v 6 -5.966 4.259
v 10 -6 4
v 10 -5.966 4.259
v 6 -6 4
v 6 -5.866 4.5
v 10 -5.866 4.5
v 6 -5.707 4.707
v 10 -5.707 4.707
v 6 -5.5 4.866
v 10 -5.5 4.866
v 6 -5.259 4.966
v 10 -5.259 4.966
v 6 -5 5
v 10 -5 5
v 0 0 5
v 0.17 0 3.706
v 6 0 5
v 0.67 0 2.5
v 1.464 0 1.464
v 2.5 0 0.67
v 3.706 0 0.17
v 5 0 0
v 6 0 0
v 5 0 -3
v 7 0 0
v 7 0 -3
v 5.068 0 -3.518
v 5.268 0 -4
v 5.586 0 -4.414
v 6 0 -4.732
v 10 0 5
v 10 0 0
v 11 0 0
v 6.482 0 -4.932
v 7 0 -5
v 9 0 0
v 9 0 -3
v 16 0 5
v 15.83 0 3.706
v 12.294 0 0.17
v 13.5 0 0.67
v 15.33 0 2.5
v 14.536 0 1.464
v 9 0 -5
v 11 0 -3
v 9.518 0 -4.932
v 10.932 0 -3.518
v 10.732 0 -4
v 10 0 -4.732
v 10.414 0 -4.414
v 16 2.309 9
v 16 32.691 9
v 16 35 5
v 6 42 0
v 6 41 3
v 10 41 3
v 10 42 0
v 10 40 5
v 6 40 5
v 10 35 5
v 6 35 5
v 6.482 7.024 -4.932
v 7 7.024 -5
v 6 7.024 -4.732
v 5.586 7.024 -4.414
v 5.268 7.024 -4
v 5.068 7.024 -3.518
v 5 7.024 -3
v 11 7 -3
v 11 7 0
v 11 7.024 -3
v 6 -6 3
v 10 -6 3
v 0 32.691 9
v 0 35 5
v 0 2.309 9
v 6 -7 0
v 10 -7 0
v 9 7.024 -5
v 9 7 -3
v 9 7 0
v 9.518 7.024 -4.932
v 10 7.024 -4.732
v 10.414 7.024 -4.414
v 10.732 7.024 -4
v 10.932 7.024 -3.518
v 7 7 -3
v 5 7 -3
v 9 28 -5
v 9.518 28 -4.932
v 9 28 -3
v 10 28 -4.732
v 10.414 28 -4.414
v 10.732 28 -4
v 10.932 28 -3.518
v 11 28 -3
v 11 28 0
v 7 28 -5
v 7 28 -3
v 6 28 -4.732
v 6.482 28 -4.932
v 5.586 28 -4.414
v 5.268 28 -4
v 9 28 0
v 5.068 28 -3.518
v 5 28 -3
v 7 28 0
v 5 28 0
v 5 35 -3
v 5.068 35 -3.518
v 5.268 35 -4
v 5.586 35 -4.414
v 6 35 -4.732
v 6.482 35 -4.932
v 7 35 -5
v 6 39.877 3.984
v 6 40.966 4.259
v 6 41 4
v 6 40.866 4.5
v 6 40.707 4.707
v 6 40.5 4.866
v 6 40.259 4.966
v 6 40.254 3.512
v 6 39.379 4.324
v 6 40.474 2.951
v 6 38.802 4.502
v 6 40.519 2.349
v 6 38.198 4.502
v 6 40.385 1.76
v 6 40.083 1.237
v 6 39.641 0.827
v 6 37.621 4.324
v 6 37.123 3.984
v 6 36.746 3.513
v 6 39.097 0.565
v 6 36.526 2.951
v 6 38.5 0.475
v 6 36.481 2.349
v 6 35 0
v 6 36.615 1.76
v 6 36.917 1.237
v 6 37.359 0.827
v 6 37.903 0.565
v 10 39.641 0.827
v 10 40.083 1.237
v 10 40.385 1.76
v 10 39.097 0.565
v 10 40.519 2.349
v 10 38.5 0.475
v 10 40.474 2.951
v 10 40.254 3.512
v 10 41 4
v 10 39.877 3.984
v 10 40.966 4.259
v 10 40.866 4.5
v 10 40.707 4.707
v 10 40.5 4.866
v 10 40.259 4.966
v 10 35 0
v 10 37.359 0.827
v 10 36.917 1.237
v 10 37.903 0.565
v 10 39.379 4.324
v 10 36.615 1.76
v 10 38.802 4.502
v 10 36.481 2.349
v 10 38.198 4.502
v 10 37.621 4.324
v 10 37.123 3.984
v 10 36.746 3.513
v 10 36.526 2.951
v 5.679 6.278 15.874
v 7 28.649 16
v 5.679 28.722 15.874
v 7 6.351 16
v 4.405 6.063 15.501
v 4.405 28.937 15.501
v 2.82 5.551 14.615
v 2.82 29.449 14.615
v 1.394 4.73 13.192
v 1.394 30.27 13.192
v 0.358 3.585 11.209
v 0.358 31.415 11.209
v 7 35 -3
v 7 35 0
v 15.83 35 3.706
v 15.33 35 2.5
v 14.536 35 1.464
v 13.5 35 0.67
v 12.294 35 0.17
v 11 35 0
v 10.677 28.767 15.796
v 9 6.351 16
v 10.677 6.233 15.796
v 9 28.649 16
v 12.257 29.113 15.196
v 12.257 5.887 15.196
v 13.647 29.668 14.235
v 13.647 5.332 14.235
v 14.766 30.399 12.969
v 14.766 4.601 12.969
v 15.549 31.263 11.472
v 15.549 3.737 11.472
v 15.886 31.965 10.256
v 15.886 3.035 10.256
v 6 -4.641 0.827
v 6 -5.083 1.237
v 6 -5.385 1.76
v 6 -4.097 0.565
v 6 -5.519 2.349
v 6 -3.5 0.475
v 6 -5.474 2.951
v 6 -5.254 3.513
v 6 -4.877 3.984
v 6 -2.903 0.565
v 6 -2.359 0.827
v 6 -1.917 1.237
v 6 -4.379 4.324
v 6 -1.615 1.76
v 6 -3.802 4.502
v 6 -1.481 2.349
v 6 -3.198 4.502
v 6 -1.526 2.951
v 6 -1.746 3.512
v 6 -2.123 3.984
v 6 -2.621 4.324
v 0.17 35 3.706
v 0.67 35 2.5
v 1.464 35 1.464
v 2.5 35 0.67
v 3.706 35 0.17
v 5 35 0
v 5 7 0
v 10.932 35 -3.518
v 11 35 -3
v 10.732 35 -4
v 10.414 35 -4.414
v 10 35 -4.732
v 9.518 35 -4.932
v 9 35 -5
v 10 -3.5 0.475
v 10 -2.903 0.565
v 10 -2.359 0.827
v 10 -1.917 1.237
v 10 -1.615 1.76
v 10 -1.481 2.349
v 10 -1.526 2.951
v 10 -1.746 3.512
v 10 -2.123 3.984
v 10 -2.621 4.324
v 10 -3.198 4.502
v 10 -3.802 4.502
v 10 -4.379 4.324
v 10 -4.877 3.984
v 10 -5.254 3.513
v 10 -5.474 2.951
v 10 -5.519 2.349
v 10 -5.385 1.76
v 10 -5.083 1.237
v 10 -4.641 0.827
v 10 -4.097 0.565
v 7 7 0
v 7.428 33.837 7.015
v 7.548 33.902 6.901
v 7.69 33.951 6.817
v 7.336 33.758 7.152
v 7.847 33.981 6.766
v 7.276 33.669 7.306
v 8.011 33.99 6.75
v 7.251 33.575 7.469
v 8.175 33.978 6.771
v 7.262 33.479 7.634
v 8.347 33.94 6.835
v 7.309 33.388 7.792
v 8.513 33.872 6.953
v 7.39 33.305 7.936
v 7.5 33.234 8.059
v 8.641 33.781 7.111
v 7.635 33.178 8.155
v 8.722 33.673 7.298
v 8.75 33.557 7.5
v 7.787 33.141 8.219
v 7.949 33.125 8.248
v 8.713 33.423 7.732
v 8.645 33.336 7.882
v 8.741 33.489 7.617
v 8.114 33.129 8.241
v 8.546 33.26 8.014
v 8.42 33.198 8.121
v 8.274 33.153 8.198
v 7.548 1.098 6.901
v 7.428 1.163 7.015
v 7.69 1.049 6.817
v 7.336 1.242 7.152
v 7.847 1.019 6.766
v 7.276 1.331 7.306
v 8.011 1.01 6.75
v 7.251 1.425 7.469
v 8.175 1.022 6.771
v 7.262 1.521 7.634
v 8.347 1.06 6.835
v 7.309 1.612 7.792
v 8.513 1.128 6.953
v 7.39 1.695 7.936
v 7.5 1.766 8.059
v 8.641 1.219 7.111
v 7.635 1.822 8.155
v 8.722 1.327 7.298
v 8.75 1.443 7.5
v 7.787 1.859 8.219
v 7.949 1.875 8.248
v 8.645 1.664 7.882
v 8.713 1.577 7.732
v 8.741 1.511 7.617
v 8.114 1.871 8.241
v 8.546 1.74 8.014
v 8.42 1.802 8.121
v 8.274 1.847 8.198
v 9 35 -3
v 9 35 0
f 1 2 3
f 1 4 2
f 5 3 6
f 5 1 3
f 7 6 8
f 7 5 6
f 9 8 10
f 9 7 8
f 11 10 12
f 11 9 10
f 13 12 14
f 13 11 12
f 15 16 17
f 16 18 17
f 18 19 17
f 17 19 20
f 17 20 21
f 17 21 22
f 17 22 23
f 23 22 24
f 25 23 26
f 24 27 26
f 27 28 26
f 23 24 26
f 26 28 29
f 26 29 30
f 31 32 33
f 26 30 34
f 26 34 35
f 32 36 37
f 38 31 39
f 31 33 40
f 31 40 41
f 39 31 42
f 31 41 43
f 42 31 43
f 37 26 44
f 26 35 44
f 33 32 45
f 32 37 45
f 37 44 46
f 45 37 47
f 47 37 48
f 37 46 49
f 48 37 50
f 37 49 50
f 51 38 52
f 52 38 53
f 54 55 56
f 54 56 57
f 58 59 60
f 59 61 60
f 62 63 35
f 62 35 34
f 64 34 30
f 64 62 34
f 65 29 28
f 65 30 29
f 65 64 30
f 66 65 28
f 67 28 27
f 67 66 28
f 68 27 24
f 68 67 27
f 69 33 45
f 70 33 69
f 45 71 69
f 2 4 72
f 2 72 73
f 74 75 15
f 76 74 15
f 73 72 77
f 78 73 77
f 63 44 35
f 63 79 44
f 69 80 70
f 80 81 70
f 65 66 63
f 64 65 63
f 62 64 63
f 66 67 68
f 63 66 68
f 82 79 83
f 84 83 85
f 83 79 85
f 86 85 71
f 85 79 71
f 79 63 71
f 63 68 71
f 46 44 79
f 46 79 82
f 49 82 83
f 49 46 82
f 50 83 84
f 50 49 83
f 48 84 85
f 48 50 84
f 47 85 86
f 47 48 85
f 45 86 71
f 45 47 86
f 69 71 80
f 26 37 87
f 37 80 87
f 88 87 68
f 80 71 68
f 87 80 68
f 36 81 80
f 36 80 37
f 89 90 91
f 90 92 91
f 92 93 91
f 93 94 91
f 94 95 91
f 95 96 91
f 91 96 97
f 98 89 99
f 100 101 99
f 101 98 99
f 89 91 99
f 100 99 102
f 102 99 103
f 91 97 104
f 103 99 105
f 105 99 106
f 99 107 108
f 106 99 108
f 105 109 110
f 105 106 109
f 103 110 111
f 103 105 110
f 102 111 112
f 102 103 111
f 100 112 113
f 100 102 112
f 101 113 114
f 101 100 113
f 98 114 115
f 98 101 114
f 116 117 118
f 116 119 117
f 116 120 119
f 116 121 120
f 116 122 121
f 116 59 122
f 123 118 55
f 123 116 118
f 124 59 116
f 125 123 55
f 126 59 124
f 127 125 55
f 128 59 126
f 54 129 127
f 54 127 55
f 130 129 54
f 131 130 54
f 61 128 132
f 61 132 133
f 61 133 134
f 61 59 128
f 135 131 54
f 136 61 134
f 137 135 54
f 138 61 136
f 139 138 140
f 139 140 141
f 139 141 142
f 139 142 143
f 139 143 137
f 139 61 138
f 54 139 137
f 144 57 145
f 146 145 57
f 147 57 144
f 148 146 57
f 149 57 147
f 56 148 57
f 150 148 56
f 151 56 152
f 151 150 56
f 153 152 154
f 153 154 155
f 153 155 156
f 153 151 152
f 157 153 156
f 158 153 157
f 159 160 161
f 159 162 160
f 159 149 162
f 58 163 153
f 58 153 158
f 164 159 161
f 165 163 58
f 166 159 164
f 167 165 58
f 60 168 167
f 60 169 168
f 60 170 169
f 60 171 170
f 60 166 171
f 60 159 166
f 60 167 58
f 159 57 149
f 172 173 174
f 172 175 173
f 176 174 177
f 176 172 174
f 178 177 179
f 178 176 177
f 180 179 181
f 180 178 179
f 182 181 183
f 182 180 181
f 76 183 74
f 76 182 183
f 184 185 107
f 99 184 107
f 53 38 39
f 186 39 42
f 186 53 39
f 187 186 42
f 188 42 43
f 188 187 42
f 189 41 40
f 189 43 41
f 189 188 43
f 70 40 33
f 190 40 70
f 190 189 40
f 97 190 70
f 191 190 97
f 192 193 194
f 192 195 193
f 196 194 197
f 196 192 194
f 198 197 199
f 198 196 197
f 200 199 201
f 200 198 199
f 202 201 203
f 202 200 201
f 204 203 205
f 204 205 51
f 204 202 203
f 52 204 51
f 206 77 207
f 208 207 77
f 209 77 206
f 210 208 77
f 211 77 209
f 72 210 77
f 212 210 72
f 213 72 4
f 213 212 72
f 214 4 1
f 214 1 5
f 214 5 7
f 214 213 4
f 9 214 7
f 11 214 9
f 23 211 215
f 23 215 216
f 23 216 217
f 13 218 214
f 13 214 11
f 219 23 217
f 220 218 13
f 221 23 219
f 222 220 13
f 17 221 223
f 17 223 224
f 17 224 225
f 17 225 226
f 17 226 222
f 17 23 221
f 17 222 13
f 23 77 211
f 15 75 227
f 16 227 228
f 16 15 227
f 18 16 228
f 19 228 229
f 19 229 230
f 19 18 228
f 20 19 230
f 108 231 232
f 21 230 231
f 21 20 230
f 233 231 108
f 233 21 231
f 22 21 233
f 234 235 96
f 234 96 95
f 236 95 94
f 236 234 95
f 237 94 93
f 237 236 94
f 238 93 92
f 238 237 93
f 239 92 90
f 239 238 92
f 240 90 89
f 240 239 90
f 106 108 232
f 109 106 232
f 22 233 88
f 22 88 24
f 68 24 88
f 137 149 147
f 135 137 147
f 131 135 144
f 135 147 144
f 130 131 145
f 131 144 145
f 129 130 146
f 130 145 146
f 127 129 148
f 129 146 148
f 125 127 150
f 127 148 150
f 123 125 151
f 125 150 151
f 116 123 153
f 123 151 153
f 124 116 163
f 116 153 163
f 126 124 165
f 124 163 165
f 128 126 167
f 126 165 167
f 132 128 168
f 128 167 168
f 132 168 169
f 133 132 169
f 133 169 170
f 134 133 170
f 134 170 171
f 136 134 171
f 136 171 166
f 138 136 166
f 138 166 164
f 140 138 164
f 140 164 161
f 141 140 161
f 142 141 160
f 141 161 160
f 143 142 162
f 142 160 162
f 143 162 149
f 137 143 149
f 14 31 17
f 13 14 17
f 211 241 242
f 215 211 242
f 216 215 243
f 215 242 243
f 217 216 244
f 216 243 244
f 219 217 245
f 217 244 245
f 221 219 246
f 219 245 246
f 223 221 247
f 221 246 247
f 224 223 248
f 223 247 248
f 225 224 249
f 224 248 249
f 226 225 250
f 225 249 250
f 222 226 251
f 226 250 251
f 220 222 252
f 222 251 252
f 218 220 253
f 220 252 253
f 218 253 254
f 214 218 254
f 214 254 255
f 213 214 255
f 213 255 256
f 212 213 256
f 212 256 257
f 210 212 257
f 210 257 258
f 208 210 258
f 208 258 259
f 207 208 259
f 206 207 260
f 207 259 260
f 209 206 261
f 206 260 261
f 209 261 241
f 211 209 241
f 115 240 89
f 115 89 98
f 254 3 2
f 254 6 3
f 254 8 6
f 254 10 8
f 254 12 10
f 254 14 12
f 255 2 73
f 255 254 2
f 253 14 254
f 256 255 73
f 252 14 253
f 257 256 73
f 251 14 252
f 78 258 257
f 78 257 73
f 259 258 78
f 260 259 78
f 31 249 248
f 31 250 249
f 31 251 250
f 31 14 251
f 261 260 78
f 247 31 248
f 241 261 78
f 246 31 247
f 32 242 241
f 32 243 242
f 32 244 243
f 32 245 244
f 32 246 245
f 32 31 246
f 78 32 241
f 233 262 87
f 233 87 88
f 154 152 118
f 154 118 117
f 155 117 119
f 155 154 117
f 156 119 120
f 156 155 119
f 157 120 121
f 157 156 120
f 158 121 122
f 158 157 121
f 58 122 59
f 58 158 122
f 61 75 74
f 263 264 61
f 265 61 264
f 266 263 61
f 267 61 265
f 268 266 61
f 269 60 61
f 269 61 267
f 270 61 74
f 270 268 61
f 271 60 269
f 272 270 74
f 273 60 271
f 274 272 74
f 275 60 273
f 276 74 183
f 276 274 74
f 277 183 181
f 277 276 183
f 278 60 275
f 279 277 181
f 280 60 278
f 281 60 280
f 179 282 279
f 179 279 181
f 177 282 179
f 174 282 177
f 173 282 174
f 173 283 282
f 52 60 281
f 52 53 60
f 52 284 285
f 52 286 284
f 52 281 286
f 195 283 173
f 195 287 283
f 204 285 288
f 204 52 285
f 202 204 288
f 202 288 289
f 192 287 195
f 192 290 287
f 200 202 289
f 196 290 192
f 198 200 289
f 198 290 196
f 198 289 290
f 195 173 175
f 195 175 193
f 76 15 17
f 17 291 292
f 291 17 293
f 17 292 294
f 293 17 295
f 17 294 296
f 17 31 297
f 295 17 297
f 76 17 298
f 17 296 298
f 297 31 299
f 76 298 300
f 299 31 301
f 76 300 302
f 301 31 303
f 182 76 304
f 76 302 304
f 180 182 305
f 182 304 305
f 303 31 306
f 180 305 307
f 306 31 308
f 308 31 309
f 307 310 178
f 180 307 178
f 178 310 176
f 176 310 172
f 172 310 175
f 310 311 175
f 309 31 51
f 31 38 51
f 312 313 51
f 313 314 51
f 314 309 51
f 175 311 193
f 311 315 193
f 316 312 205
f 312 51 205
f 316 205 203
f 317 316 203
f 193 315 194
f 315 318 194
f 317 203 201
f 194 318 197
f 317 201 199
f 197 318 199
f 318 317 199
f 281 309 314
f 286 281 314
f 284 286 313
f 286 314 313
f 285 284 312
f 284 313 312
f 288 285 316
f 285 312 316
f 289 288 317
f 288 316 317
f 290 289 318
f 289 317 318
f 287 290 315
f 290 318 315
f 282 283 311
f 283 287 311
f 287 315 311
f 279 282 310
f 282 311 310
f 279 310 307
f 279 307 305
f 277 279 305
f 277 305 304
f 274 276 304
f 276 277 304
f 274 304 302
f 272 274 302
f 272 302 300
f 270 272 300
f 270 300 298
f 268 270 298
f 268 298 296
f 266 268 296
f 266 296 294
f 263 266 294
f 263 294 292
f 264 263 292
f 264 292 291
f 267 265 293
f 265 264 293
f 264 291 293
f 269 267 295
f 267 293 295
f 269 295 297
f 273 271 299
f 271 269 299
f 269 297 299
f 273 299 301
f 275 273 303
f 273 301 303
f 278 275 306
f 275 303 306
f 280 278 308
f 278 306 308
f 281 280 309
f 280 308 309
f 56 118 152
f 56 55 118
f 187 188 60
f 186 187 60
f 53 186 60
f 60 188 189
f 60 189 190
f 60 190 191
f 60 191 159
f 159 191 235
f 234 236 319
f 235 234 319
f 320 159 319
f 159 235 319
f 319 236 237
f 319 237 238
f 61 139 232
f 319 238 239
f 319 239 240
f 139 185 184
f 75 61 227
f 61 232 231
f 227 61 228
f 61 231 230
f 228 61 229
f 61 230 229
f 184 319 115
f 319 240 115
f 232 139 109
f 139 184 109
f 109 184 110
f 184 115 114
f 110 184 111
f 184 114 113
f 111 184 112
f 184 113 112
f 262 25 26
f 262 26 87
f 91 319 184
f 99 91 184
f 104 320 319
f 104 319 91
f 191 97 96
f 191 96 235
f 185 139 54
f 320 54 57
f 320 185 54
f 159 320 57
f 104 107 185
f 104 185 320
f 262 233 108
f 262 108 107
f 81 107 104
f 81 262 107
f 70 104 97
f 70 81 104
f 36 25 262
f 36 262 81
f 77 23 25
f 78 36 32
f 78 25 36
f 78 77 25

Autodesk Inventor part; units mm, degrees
ref_plane "YZ Plane" through (0, 0, 0) normal (1, 0, 0) x (0, 1, 0)
ref_plane "XZ Plane" through (0, 0, 0) normal (0, 1, 0) x (-1, 0, 0)
ref_plane "XY Plane" through (0, 0, 0) normal (0, 0, 1) x (1, 0, 0)
sketch "Sketch3" plane through (0, 0, 0) normal (0, 0, 1) x (1, 0, 0)
  line L0 (0, 0) -> (16, 0)
  line L1 (16, 0) -> (16, 35)
  line L2 (16, 35) -> (0, 35)
  line L3 (0, 35) -> (0, 0)
  dimension "d0" = 16
  dimension "d1" = 35
extrude "Extrusion1" add sketch "Sketch3" along normal blind 16
fillet "Fillet1" radius 7 2 edges at (16, 17.5, 16) (0, 17.5, 16)
fillet "Fillet2" radius 5 2 edges at (16, 17.5, 0) (0, 17.5, 0)
sketch "Sketch4" plane through (16, 0, 9) normal (1, 0, 0) x (0, 0, -1)
  line L0 (4, 35) -> (0, 35) projected
  line L1 (4, 35) -> (-7, 28.6491)
  line L2 (-7, 35) -> (-7, 0) projected
  line L3 (4, 35) -> (16.7017, 35) construction
  line L4 (-7, 28.6491) -> (-7, 35)
  line L5 (-7, 35) -> (4, 35)
  line L6 (4, 0) -> (0, 0) projected
  line L7 (4, 0) -> (-7, 6.3509)
  line L8 (4, 0) -> (16.7017, 0) construction
  line L9 (-7, 6.3509) -> (-7, 0)
  line L10 (-7, 0) -> (4, 0)
  point P0 (9, 0)
  point P1 (-7, 0)
  point P2 (0, 0)
  dimension "d6" = 150
  dimension "d7" = 150
extrude "Extrusion2" cut sketch "Sketch4" against normal through all
sketch "Sketch5" plane through (5, 35, 0) normal (0, 1, 0) x (1, 0, 0)
  line L0 (-5, -9) -> (-5, -5) projected
  line L1 (0, 0) -> (6, 0) projected
  line L2 (5, 0) -> (1, 0)
  line L3 (1, 0) -> (1, -5)
  line L4 (1, -5) -> (5, -5)
  line L5 (5, -5) -> (5, 0)
  line L6 (1, 0) -> (5, 0)
  point P0 (-5, 0)
  dimension "d47" = 4
extrude "Extrusion3" add sketch "Sketch5" along normal blind 6
sketch "Sketch11" plane through (0, 0, 0) normal (0, 0, -1) x (-1, 0, 0)
  line L0 (-11, 0) -> (-11, 35) projected
  line L1 (-9, 28.6491) -> (-9, 6.3509) projected
  line L2 (-11, 0) -> (-9, 0)
  line L3 (-9, 0) -> (-9, 7)
  line L4 (-9, 7) -> (-11, 7)
  line L5 (-11, 7) -> (-11, 0)
  line L6 (-5, 0) -> (-7, 0)
  line L7 (-7, 0) -> (-7, 7)
  line L8 (-7, 7) -> (-5, 7)
  line L9 (-5, 7) -> (-5, 0)
  line L10 (-11, 35) -> (-9, 35)
  line L11 (-9, 35) -> (-9, 28)
  line L12 (-9, 28) -> (-11, 28)
  line L13 (-11, 28) -> (-11, 35)
  line L14 (-5, 35) -> (-7, 35)
  line L15 (-7, 35) -> (-7, 28)
  line L16 (-7, 28) -> (-5, 28)
  line L17 (-5, 28) -> (-5, 35)
  point P0 (0, 0)
  point P1 (-9, 6.3509)
  point P2 (-11, 28)
  dimension "d32" = 7
  dimension "d33" = 2
  dimension "d34" = 7
  dimension "d35" = 7
  dimension "d36" = 7
extrude "Extrusion9" add sketch "Sketch11" along normal blind 3 contours L0 L4 L1 L3 L2 | L0 L10 L11 L1 L12 | L6 L7 L8 L9 | L17 L16 L15 L14
sketch "Sketch12" plane through (0, 0, -3) normal (0, 0, -1) x (-1, 0, 0)
  line L0 (-9, 35) -> (-11, 35) projected
  line L1 (-5, 28) -> (-7, 28) projected
  line L2 (-11, 35) -> (-5, 35)
  line L3 (-5, 35) -> (-5, 28)
  line L4 (-5, 28) -> (-11, 28)
  line L5 (-11, 28) -> (-11, 35)
  line L6 (-11, 0) -> (-16, 0) projected
  line L7 (-11, 0) -> (-5, 0)
  line L8 (-5, 0) -> (-5, 7.0241)
  line L9 (-5, 7.0241) -> (-11, 7.0241)
  line L10 (-11, 7.0241) -> (-11, 0)
  point P0 (0, 0)
  point P1 (-5, -5)
  point P2 (-11, 2)
extrude "Extrusion10" add sketch "Sketch12" along normal blind 2
sketch "Sketch13" plane through (0, 0, 5) normal (0, -1, 0) x (1, 0, 0)
  circle A0 centre (8, 2.5) radius 0.75
  point P0 (0, -5)
  dimension "d42" = 1.5
extrude "Extrusion11" cut sketch "Sketch13" against normal through all
fillet "Fillet4" radius 2 4 edges at (11, 31.5, -5) (5, 31.5, -5) (5, 3.5121, -5) (11, 3.5121, -5)
sketch "Sketch14" plane through (10, 35, 5) normal (1, 0, 0) x (0, 0, -1)
  circle A0 centre (2.5, 3.5) radius 2.025
  line L0 (0, 6) -> (5, 6) projected
  point P0 (5, -35)
  dimension "d48" = 4.05
  dimension "d59" = 2.5
extrude "Extrusion12" cut sketch "Sketch14" against normal blind 5
sketch "Sketch15" plane through (0, 0, 5) normal (0, -1, 0) x (1, 0, 0)
  line L0 (10, -5) -> (10, 0) projected
  line L1 (10, 0) -> (6, 0)
  line L2 (6, 0) -> (6, -5)
  line L3 (6, -5) -> (10, -5)
  line L4 (10, -5) -> (10, 0)
  point P0 (0, -5)
  point P1 (10, -0.475)
  point P2 (6, -0.475)
  dimension "d60" = 5
  dimension "d61" = 4
extrude "Extrusion13" add sketch "Sketch15" along normal blind 6
sketch "Sketch16" plane through (10, 0, 5) normal (1, 0, 0) x (0, 0, -1)
  circle A0 centre (2.5, -3.5) radius 2.025
  line L0 (5, -6) -> (0, -6) projected
  point P0 (5, 0)
  dimension "d54" = 4.05
  dimension "d58" = 2.5
extrude "Extrusion14" cut sketch "Sketch16" against normal blind 5
fillet "Fillet7" radius 1 1 edges at (8, -6, 5)
sketch "Sketch17" plane through (0, -6, 5) normal (0, -1, 0) x (1, 0, 0)
  line L0 (6, -5) -> (10, -5) projected
  line L1 (6, -4.525) -> (6, -0.475) projected
  line L2 (10, -5) -> (6, -5)
  line L3 (6, -5) -> (6, -2)
  line L4 (6, -2) -> (10, -2)
  line L5 (10, -2) -> (10, -5)
  point P0 (0, -5)
  dimension "d63" = 3
extrude "Extrusion15" add sketch "Sketch17" along normal blind 1
fillet "Fillet8" radius 1 1 edges at (8, 41, 5)
sketch "Sketch18" plane through (5, 41, 0) normal (0, 1, 0) x (1, 0, 0)
  line L0 (1, -3) -> (5, -3) projected
  line L1 (1, -5) -> (1, 0) projected
  line L2 (5, -3) -> (1, -3)
  line L3 (1, -3) -> (1, 0)
  line L4 (1, 0) -> (5, 0)
  line L5 (5, 0) -> (5, -3)
  point P0 (-5, 0)
extrude "Extrusion16" add sketch "Sketch18" along normal blind 1
sketch "Sketch19" plane through (6, 0, 0) normal (-1, 0, 0) x (0, 0, 1)
  line L0 (3, -6) -> (3, -7) projected
  line L1 (0, 0) -> (0, -7) projected
  line L2 (3, -6) -> (0, -7)
  line L3 (0, -7) -> (3, -7)
  line L4 (3, -7) -> (3, -6)
extrude "Extrusion17" cut sketch "Sketch19" against normal through all
sketch "Sketch20" plane through (6, 35, 0) normal (-1, 0, 0) x (0, 0, 1)
  line L0 (4, 6) -> (3, 6) projected
  line L1 (0, 0) -> (0, 7) projected
  line L2 (3, 6) -> (0, 7)
  line L3 (0, 7) -> (3, 7)
  line L4 (3, 7) -> (3, 6)
  point P0 (0, -35)
extrude "Extrusion18" cut sketch "Sketch20" against normal through all
properties part number "FingerMiddle"
